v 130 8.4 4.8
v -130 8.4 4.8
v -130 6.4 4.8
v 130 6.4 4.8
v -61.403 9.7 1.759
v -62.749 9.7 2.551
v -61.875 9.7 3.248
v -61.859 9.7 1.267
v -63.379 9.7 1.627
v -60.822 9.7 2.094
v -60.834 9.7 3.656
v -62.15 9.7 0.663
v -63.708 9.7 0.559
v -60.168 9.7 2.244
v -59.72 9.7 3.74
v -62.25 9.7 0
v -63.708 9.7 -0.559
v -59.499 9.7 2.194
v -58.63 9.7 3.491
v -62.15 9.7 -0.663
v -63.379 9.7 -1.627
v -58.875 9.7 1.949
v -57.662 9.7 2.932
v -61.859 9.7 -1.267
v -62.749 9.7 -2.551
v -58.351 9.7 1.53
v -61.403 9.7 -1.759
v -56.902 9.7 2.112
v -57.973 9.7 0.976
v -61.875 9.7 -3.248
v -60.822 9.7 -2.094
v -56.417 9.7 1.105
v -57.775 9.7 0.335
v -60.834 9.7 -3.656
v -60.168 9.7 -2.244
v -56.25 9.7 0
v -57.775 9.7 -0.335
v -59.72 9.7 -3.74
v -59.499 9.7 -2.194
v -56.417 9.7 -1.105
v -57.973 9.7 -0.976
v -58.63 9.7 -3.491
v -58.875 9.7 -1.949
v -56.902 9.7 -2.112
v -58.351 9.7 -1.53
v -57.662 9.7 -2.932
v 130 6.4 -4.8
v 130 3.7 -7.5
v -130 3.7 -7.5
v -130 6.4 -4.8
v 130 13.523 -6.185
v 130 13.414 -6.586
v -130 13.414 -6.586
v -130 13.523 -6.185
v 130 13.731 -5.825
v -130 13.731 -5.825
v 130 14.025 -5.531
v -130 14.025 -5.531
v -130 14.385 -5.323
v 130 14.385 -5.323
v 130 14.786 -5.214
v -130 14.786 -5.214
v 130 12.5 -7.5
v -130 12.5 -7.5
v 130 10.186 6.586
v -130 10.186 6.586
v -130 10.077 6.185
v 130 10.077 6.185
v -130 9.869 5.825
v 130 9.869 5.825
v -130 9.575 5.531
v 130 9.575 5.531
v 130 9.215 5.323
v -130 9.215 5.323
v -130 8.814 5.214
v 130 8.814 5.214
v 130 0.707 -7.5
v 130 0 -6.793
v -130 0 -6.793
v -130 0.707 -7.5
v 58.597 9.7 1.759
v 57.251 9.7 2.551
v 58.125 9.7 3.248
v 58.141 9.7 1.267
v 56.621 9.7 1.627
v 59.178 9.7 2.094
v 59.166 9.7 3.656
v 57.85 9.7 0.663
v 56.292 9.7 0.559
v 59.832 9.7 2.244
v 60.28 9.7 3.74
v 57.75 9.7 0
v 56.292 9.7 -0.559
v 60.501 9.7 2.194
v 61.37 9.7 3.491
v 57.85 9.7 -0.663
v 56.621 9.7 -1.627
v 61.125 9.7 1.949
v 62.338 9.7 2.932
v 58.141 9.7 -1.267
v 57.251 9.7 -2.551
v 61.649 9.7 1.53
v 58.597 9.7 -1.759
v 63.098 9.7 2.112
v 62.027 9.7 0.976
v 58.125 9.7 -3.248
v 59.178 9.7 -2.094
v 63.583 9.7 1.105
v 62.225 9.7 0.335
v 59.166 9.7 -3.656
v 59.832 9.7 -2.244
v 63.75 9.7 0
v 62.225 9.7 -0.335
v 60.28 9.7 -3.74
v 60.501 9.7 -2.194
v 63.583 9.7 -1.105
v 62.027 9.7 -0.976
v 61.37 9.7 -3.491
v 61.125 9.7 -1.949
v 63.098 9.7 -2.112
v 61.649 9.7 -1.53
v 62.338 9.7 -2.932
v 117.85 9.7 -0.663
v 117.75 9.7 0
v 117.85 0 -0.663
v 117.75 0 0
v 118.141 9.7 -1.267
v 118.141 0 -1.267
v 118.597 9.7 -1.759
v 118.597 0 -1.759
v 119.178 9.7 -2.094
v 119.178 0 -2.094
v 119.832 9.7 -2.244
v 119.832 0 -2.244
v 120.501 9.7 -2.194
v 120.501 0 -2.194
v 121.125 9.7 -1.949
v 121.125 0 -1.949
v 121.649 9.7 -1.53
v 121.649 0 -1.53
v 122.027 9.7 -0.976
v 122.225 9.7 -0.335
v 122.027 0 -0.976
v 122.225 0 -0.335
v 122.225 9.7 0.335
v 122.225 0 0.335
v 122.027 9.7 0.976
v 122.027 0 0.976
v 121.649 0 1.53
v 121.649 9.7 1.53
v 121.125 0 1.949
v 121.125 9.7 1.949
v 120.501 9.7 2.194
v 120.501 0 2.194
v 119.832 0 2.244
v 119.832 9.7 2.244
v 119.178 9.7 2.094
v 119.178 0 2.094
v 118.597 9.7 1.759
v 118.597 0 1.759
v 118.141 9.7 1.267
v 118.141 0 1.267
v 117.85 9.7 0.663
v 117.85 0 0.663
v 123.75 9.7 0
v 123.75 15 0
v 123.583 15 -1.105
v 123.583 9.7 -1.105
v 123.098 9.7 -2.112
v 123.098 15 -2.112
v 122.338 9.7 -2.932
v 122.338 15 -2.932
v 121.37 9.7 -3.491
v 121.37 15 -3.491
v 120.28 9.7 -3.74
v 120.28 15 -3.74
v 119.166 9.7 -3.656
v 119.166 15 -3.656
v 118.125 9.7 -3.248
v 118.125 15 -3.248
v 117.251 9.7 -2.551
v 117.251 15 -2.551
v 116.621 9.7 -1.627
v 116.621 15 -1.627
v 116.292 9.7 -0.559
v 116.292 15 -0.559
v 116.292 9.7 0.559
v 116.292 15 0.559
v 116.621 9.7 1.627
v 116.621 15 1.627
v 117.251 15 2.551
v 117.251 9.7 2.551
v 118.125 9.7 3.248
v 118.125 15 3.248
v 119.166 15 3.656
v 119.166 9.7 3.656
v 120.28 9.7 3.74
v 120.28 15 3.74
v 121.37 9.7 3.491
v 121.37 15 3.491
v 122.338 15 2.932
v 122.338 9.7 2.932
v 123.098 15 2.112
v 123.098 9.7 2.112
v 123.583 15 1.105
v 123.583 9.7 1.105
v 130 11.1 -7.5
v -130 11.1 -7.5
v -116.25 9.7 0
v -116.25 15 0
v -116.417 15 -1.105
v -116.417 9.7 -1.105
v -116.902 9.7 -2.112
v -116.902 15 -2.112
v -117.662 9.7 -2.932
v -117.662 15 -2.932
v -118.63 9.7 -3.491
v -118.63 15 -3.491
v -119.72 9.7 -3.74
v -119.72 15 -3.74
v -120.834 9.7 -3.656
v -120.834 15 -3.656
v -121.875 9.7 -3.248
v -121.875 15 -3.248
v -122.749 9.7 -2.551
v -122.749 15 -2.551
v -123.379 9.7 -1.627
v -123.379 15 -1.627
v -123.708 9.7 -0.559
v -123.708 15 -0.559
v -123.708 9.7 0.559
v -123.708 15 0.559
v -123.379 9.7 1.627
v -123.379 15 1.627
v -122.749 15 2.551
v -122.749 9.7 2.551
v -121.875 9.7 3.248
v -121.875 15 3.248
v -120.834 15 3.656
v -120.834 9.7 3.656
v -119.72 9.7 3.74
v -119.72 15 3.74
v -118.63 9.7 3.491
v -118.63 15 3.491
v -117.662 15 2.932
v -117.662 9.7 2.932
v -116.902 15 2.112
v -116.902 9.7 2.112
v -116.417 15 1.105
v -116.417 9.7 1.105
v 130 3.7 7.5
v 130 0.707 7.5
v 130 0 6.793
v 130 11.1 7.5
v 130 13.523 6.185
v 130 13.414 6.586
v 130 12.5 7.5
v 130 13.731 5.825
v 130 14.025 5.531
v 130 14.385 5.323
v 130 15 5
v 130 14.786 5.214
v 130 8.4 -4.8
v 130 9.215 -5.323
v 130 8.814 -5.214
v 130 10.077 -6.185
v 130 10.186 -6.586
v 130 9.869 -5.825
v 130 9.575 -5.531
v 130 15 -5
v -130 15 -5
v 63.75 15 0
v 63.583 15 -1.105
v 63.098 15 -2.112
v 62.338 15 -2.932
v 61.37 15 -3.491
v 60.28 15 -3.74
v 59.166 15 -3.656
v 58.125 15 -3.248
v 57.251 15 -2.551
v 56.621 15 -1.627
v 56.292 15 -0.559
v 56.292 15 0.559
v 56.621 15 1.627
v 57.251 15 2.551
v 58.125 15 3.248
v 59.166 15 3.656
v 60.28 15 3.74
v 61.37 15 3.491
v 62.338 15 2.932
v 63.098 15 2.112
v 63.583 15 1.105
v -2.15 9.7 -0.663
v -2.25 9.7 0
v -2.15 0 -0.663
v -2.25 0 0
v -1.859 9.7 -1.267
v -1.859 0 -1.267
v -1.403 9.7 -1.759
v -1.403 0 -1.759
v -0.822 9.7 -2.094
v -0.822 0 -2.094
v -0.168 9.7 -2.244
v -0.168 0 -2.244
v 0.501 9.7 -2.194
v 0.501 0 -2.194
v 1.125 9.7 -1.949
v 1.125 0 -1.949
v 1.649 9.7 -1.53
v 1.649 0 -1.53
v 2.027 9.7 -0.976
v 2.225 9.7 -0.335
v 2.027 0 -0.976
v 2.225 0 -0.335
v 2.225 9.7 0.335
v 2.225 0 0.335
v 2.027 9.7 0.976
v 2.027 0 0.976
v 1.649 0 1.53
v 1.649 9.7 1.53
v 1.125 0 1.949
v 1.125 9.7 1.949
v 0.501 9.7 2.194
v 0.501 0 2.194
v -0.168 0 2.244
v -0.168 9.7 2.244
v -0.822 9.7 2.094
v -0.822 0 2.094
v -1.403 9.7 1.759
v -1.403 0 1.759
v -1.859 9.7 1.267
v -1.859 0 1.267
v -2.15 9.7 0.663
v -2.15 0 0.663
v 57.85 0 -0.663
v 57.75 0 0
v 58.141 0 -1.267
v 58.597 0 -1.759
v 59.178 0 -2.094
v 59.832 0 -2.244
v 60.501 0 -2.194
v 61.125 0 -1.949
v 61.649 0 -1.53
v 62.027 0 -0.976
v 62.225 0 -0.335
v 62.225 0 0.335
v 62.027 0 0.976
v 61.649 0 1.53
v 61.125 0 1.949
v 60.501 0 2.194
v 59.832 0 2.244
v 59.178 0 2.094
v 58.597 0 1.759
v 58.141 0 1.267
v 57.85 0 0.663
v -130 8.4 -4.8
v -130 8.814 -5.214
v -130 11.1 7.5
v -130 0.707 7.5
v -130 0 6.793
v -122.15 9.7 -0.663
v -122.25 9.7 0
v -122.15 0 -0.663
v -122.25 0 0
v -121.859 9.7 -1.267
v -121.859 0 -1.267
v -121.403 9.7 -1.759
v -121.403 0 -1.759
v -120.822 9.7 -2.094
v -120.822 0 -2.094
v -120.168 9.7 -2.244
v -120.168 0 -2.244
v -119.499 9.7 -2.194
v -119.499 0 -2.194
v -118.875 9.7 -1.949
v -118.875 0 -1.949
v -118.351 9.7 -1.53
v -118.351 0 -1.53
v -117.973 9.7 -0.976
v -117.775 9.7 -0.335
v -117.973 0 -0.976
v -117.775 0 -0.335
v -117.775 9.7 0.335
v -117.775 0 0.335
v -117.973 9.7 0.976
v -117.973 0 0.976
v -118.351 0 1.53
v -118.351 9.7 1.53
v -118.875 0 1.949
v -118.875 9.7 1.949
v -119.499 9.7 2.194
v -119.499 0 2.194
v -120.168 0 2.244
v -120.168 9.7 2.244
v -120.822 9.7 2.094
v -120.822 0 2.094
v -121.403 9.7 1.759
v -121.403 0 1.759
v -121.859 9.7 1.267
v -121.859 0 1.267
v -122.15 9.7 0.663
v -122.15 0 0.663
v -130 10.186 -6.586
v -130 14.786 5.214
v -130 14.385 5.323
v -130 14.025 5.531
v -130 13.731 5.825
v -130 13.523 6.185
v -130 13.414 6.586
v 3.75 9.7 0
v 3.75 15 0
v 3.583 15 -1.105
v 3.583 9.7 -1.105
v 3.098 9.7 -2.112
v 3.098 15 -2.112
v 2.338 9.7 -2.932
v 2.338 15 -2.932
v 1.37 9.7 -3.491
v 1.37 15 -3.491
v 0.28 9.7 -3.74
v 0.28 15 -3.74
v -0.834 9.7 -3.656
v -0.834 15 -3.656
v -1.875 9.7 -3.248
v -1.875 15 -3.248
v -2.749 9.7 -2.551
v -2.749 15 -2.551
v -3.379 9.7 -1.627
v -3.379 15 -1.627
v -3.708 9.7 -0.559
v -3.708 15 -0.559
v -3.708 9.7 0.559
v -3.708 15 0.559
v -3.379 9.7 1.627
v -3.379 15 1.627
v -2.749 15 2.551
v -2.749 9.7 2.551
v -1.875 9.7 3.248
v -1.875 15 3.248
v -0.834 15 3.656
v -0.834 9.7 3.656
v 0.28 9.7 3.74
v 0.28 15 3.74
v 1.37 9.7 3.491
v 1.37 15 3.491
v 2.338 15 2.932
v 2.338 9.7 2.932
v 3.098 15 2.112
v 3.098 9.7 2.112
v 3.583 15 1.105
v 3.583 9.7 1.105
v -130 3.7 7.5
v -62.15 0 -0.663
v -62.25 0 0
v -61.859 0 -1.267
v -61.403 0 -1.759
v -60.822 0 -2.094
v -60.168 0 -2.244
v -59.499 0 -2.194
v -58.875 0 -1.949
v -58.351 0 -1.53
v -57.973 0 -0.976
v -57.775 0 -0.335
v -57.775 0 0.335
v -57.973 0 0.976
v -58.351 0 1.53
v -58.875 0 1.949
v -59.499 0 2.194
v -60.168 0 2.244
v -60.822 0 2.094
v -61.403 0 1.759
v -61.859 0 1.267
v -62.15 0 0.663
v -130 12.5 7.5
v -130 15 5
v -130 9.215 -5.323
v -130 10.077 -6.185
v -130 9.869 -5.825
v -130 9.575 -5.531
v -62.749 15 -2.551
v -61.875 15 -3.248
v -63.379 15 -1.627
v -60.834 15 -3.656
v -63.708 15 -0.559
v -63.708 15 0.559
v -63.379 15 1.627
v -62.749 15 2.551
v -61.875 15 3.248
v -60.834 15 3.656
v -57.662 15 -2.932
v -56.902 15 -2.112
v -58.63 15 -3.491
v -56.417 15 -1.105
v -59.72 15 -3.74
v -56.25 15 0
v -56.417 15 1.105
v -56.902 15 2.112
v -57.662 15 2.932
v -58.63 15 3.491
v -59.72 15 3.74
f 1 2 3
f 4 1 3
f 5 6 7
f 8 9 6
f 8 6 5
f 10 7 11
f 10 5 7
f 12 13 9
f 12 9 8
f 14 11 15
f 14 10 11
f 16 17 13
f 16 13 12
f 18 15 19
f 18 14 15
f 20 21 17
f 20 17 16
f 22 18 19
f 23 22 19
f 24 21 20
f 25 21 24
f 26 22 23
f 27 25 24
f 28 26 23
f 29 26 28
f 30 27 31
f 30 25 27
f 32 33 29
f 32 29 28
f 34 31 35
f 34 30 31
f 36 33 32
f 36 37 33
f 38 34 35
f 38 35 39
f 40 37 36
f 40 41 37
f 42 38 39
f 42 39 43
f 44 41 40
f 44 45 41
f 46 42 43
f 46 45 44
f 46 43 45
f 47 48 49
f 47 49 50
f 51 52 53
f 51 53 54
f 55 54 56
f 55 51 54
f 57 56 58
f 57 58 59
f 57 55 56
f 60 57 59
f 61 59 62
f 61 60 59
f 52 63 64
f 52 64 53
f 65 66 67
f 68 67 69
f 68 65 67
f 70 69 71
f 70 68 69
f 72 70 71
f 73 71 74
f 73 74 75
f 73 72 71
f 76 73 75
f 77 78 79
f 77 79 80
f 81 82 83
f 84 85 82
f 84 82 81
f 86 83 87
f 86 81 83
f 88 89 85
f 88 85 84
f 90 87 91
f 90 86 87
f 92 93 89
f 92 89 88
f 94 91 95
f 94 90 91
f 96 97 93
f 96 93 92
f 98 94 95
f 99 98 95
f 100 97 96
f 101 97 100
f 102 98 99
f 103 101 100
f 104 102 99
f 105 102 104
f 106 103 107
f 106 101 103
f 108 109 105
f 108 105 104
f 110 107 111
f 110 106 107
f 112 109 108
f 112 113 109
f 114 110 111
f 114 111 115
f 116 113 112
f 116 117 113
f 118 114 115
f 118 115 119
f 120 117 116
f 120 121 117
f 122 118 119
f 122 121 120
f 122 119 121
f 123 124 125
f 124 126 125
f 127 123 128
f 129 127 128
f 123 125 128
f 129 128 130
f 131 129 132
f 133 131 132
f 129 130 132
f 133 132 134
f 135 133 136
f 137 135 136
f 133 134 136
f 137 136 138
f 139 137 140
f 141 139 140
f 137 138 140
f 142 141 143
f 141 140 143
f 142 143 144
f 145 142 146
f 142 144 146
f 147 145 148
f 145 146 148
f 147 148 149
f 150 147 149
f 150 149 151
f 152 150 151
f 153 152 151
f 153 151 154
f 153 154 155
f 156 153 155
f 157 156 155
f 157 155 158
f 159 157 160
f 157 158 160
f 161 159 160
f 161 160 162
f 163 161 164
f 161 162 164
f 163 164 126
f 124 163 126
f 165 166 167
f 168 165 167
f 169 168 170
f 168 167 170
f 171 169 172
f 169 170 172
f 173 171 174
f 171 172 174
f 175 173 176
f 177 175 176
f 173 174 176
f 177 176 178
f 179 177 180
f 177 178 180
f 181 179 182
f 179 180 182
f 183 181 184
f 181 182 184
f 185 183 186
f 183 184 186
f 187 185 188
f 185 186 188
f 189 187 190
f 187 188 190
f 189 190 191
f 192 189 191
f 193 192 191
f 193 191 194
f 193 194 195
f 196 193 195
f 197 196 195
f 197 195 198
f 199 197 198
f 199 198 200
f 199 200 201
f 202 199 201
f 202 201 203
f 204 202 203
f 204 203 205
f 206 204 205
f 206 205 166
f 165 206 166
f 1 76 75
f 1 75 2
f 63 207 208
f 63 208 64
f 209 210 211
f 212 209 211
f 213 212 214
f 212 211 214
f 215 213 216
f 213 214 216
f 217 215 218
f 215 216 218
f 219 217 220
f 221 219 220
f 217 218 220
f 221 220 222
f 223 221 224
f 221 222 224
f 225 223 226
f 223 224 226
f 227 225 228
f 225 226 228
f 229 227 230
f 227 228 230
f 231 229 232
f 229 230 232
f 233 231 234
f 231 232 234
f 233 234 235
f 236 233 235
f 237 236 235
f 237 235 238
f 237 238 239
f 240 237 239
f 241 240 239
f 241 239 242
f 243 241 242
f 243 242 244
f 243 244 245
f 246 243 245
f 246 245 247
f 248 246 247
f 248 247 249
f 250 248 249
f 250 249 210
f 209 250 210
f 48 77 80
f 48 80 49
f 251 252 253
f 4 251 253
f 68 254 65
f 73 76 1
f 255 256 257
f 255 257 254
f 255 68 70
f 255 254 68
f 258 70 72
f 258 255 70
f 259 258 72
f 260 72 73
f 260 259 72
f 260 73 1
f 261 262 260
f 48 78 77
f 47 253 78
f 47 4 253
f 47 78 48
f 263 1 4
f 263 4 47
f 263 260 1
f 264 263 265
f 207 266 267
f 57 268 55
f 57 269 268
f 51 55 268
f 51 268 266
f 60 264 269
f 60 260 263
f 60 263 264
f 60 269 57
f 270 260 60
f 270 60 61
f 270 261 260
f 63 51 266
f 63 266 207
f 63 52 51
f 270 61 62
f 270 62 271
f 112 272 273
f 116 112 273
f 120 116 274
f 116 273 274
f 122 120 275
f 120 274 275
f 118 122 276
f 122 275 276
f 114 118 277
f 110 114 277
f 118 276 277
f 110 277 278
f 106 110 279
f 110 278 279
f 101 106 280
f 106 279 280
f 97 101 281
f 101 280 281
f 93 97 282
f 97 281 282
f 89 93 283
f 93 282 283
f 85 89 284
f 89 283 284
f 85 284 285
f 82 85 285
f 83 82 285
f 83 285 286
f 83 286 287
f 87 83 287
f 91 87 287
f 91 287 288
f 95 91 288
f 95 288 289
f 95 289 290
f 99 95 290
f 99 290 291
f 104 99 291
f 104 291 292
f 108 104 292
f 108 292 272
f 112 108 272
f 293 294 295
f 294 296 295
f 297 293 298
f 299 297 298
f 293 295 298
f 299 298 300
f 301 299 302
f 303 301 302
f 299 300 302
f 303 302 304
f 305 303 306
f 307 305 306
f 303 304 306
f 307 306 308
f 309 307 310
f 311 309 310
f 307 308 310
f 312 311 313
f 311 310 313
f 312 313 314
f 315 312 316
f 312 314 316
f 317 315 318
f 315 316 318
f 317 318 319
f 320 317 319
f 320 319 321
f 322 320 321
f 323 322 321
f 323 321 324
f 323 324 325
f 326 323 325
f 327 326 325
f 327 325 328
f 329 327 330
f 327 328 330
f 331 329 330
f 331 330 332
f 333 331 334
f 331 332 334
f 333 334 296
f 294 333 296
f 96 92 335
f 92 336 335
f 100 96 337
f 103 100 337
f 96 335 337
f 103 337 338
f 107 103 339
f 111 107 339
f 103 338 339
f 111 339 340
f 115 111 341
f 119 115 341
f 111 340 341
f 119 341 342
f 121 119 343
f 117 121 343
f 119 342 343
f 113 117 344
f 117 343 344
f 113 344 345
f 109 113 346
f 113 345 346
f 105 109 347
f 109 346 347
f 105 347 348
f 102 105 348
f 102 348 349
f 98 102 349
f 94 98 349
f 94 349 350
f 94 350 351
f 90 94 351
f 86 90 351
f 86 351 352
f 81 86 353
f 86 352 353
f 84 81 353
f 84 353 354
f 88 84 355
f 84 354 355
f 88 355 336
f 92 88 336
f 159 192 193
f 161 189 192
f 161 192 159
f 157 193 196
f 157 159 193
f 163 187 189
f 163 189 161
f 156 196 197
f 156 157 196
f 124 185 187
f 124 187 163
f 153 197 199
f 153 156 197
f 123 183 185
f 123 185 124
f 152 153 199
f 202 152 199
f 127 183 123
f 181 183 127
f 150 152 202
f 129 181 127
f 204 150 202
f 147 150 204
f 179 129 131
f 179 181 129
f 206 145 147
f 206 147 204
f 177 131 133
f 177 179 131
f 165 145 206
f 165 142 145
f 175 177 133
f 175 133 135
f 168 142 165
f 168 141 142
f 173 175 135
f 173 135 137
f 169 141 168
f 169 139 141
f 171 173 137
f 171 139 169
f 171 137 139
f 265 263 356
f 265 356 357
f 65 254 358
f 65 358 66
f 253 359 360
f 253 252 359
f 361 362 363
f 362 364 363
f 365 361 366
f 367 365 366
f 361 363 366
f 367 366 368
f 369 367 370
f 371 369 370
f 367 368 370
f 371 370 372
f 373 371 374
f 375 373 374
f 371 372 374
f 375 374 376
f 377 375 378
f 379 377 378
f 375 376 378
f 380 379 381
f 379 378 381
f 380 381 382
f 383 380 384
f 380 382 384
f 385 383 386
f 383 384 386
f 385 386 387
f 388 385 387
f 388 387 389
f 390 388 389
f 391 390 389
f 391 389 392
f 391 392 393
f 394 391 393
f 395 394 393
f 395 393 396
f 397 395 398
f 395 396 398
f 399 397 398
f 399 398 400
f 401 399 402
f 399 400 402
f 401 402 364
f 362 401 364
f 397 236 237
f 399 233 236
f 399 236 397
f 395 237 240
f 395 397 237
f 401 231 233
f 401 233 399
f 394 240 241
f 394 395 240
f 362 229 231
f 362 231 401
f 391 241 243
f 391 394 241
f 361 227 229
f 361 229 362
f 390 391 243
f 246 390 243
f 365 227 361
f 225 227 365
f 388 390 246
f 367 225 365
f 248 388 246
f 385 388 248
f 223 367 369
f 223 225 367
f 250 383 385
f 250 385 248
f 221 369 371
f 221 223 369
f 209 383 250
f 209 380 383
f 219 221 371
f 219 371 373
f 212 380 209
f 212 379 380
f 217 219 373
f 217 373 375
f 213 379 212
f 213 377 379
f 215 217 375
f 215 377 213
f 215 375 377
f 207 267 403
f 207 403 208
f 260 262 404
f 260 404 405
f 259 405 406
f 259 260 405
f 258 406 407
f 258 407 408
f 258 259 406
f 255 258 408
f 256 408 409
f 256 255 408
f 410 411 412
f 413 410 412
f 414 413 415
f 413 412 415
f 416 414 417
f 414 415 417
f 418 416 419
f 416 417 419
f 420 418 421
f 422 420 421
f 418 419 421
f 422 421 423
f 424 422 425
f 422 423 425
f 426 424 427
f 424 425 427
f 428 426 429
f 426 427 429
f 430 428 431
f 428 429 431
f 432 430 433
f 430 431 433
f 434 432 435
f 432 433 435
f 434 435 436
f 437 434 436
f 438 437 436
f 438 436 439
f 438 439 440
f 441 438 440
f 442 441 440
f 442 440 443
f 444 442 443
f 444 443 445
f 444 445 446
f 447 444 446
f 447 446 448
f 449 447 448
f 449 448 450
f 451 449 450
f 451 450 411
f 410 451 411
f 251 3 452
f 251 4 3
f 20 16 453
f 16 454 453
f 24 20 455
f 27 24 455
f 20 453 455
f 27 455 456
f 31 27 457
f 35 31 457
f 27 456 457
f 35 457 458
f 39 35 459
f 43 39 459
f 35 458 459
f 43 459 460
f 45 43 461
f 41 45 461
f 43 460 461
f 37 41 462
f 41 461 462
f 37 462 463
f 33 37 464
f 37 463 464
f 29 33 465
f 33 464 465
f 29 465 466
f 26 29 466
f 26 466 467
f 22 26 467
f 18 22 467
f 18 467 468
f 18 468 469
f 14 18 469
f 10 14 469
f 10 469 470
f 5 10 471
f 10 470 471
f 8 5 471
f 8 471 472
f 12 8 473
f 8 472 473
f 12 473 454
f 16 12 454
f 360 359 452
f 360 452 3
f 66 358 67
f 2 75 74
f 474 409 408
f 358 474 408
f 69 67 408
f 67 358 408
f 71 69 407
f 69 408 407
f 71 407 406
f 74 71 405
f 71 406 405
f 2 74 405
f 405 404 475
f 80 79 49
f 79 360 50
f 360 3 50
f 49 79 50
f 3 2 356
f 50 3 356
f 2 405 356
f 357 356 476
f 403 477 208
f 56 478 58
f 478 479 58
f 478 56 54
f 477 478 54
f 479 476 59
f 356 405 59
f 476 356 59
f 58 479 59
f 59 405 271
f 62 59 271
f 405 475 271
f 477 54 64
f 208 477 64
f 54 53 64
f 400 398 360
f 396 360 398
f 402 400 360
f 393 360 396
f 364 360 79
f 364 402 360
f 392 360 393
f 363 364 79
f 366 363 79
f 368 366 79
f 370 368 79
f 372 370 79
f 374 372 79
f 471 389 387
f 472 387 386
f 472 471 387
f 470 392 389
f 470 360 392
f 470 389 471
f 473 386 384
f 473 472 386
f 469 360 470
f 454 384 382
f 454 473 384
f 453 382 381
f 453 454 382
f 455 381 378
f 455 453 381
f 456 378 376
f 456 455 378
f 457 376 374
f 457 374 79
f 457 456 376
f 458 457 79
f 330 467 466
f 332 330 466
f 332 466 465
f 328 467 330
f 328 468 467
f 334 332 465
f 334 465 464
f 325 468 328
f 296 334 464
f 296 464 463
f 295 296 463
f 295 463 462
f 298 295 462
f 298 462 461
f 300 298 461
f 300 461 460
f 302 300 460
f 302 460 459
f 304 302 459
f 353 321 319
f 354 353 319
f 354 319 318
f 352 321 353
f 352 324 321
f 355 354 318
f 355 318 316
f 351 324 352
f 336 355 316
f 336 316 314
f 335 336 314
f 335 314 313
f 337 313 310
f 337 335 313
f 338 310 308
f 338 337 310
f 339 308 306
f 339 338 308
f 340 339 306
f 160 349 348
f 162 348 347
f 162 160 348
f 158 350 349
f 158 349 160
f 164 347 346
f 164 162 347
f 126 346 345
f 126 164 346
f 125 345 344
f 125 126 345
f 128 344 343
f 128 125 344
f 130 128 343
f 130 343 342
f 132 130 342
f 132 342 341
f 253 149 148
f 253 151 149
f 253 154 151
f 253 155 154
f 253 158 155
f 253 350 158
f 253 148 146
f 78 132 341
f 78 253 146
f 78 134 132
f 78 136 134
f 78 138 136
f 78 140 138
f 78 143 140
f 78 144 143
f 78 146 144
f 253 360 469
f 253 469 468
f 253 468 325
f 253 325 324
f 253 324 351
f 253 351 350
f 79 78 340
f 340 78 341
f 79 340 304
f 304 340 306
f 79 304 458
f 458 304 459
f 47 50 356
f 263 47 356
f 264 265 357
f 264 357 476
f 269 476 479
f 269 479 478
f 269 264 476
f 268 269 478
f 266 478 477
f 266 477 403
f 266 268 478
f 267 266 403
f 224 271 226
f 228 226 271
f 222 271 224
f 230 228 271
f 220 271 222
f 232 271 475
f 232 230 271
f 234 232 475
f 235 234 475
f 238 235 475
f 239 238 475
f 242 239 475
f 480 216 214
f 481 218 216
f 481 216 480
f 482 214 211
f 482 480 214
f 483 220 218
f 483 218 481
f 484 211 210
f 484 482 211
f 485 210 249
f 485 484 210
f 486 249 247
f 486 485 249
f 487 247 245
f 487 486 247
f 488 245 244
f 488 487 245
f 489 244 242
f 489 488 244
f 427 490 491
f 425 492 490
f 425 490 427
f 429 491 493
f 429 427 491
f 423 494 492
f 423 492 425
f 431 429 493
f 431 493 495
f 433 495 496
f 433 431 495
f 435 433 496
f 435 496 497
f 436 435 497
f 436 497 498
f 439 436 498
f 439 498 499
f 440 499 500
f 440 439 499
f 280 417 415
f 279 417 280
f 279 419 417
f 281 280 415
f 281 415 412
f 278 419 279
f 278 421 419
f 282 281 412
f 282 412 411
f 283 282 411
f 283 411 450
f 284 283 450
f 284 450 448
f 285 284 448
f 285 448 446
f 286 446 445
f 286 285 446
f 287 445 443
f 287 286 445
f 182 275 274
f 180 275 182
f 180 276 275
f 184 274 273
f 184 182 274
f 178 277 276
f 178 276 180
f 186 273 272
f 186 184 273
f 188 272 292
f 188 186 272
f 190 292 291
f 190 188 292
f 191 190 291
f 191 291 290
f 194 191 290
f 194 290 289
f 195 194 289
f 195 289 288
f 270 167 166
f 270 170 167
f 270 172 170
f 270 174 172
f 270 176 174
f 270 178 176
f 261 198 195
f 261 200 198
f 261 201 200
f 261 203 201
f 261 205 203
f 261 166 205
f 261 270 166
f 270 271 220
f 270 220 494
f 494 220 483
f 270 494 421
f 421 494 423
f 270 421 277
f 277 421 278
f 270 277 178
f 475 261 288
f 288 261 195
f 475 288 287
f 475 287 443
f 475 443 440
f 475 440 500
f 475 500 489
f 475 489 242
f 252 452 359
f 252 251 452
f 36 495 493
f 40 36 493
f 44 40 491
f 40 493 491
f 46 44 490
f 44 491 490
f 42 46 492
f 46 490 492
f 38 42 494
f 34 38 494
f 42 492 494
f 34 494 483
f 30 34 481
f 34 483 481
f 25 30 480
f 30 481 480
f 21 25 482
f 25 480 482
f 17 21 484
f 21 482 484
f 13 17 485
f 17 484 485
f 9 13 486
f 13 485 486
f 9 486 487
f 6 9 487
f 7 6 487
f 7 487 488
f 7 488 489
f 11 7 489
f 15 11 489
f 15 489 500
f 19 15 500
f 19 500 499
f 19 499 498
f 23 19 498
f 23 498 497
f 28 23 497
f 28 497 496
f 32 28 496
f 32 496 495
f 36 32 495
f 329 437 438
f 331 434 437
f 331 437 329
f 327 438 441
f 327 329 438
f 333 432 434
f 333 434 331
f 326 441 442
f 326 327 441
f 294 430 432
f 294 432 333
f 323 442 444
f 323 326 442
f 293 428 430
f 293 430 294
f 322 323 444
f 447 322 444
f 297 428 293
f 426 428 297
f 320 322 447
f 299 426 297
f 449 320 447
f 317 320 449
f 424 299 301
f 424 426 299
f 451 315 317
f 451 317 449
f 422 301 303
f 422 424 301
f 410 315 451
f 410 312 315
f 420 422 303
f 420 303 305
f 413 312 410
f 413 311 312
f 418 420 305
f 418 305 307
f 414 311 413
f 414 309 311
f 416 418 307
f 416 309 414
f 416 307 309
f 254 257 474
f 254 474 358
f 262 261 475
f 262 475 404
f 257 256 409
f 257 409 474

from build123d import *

# Parameters (mm, degrees)
EXTRUDE_1_DEPTH                  = 130
HOLE_WIZARD_M4_78051_D           = 4.5
HOLE_WIZARD_M4_78051_CBORE_D     = 7.5
HOLE_WIZARD_M4_78051_CBORE_DEPTH = 5.3
PATTERN_LINEAR_1_COUNT           = 3
PATTERN_LINEAR_1_PITCH           = 60
PATTERN_LINEAR_2_COUNT           = 3
PATTERN_LINEAR_2_PITCH           = 60


with BuildPart() as part:
    # Эскиз1 → Бобышка-Вытянуть1 (new, symmetric)
    with BuildSketch(Plane(origin=(0, 0, 0), x_dir=(0, 0, -1), z_dir=(1, 0, 0))):
        with BuildLine():
            Line((-7.5, 0.707106781), (-6.792893219, 0))
            Line((-6.792893219, 0), (6.792893219, 0))
            Line((6.792893219, 0), (7.5, 0.707106781))
            Line((7.5, 0.707106781), (7.5, 3.7))
            Line((7.5, 3.7), (4.8, 6.4))
            Line((4.8, 6.4), (4.8, 8.4))
            Line((4.8, 8.4), (5.21443454, 8.81443454))
            ThreePointArc((5.21443454, 8.81443454), (5.66862915, 9.73137085), (6.58556546, 10.18556546))
            Line((6.58556546, 10.18556546), (7.5, 11.1))
            Line((7.5, 11.1), (7.5, 12.5))
            Line((7.5, 12.5), (6.58556546, 13.41443454))
            ThreePointArc((6.58556546, 13.41443454), (5.66862915, 13.86862915), (5.21443454, 14.78556546))
            Line((5.21443454, 14.78556546), (5, 15))
            Line((5, 15), (-5, 15))
            Line((-5, 15), (-5.21443454, 14.78556546))
            ThreePointArc((-5.21443454, 14.78556546), (-5.66862915, 13.86862915), (-6.58556546, 13.41443454))
            Line((-6.58556546, 13.41443454), (-7.5, 12.5))
            Line((-7.5, 12.5), (-7.5, 11.1))
            Line((-7.5, 11.1), (-6.58556546, 10.18556546))
            ThreePointArc((-6.58556546, 10.18556546), (-5.66862915, 9.73137085), (-5.21443454, 8.81443454))
            Line((-5.21443454, 8.81443454), (-4.8, 8.4))
            Line((-4.8, 8.4), (-4.8, 6.4))
            Line((-4.8, 6.4), (-7.5, 3.7))
            Line((-7.5, 3.7), (-7.5, 0.707106781))
        make_face()
    extrude(amount=EXTRUDE_1_DEPTH, both=True)

    # Цековка M4 для болта с шестигранной головкой класса А ГОСТ 78051 (through all)
    with Locations(Plane(origin=(0, 15, 0), x_dir=(1, 0, 0), z_dir=(0, 1, 0))):
        with Locations((0, 0)):
            hole_wizard_m4_78051 = CounterBoreHole(HOLE_WIZARD_M4_78051_D / 2, HOLE_WIZARD_M4_78051_CBORE_D / 2, HOLE_WIZARD_M4_78051_CBORE_DEPTH)

    # Линейный массив1: Цековка M4 для болта с шестигранной головкой класса А ГОСТ 78051 ×3
    with Locations(*[(i * PATTERN_LINEAR_1_PITCH, 0, 0) for i in range(1, PATTERN_LINEAR_1_COUNT)]):
        add(hole_wizard_m4_78051, mode=Mode.SUBTRACT)

    # Линейный массив2: Цековка M4 для болта с шестигранной головкой класса А ГОСТ 78051 ×3
    with Locations(*[(-i * PATTERN_LINEAR_2_PITCH, 0, 0) for i in range(1, PATTERN_LINEAR_2_COUNT)]):
        add(hole_wizard_m4_78051, mode=Mode.SUBTRACT)


solid = part.part
